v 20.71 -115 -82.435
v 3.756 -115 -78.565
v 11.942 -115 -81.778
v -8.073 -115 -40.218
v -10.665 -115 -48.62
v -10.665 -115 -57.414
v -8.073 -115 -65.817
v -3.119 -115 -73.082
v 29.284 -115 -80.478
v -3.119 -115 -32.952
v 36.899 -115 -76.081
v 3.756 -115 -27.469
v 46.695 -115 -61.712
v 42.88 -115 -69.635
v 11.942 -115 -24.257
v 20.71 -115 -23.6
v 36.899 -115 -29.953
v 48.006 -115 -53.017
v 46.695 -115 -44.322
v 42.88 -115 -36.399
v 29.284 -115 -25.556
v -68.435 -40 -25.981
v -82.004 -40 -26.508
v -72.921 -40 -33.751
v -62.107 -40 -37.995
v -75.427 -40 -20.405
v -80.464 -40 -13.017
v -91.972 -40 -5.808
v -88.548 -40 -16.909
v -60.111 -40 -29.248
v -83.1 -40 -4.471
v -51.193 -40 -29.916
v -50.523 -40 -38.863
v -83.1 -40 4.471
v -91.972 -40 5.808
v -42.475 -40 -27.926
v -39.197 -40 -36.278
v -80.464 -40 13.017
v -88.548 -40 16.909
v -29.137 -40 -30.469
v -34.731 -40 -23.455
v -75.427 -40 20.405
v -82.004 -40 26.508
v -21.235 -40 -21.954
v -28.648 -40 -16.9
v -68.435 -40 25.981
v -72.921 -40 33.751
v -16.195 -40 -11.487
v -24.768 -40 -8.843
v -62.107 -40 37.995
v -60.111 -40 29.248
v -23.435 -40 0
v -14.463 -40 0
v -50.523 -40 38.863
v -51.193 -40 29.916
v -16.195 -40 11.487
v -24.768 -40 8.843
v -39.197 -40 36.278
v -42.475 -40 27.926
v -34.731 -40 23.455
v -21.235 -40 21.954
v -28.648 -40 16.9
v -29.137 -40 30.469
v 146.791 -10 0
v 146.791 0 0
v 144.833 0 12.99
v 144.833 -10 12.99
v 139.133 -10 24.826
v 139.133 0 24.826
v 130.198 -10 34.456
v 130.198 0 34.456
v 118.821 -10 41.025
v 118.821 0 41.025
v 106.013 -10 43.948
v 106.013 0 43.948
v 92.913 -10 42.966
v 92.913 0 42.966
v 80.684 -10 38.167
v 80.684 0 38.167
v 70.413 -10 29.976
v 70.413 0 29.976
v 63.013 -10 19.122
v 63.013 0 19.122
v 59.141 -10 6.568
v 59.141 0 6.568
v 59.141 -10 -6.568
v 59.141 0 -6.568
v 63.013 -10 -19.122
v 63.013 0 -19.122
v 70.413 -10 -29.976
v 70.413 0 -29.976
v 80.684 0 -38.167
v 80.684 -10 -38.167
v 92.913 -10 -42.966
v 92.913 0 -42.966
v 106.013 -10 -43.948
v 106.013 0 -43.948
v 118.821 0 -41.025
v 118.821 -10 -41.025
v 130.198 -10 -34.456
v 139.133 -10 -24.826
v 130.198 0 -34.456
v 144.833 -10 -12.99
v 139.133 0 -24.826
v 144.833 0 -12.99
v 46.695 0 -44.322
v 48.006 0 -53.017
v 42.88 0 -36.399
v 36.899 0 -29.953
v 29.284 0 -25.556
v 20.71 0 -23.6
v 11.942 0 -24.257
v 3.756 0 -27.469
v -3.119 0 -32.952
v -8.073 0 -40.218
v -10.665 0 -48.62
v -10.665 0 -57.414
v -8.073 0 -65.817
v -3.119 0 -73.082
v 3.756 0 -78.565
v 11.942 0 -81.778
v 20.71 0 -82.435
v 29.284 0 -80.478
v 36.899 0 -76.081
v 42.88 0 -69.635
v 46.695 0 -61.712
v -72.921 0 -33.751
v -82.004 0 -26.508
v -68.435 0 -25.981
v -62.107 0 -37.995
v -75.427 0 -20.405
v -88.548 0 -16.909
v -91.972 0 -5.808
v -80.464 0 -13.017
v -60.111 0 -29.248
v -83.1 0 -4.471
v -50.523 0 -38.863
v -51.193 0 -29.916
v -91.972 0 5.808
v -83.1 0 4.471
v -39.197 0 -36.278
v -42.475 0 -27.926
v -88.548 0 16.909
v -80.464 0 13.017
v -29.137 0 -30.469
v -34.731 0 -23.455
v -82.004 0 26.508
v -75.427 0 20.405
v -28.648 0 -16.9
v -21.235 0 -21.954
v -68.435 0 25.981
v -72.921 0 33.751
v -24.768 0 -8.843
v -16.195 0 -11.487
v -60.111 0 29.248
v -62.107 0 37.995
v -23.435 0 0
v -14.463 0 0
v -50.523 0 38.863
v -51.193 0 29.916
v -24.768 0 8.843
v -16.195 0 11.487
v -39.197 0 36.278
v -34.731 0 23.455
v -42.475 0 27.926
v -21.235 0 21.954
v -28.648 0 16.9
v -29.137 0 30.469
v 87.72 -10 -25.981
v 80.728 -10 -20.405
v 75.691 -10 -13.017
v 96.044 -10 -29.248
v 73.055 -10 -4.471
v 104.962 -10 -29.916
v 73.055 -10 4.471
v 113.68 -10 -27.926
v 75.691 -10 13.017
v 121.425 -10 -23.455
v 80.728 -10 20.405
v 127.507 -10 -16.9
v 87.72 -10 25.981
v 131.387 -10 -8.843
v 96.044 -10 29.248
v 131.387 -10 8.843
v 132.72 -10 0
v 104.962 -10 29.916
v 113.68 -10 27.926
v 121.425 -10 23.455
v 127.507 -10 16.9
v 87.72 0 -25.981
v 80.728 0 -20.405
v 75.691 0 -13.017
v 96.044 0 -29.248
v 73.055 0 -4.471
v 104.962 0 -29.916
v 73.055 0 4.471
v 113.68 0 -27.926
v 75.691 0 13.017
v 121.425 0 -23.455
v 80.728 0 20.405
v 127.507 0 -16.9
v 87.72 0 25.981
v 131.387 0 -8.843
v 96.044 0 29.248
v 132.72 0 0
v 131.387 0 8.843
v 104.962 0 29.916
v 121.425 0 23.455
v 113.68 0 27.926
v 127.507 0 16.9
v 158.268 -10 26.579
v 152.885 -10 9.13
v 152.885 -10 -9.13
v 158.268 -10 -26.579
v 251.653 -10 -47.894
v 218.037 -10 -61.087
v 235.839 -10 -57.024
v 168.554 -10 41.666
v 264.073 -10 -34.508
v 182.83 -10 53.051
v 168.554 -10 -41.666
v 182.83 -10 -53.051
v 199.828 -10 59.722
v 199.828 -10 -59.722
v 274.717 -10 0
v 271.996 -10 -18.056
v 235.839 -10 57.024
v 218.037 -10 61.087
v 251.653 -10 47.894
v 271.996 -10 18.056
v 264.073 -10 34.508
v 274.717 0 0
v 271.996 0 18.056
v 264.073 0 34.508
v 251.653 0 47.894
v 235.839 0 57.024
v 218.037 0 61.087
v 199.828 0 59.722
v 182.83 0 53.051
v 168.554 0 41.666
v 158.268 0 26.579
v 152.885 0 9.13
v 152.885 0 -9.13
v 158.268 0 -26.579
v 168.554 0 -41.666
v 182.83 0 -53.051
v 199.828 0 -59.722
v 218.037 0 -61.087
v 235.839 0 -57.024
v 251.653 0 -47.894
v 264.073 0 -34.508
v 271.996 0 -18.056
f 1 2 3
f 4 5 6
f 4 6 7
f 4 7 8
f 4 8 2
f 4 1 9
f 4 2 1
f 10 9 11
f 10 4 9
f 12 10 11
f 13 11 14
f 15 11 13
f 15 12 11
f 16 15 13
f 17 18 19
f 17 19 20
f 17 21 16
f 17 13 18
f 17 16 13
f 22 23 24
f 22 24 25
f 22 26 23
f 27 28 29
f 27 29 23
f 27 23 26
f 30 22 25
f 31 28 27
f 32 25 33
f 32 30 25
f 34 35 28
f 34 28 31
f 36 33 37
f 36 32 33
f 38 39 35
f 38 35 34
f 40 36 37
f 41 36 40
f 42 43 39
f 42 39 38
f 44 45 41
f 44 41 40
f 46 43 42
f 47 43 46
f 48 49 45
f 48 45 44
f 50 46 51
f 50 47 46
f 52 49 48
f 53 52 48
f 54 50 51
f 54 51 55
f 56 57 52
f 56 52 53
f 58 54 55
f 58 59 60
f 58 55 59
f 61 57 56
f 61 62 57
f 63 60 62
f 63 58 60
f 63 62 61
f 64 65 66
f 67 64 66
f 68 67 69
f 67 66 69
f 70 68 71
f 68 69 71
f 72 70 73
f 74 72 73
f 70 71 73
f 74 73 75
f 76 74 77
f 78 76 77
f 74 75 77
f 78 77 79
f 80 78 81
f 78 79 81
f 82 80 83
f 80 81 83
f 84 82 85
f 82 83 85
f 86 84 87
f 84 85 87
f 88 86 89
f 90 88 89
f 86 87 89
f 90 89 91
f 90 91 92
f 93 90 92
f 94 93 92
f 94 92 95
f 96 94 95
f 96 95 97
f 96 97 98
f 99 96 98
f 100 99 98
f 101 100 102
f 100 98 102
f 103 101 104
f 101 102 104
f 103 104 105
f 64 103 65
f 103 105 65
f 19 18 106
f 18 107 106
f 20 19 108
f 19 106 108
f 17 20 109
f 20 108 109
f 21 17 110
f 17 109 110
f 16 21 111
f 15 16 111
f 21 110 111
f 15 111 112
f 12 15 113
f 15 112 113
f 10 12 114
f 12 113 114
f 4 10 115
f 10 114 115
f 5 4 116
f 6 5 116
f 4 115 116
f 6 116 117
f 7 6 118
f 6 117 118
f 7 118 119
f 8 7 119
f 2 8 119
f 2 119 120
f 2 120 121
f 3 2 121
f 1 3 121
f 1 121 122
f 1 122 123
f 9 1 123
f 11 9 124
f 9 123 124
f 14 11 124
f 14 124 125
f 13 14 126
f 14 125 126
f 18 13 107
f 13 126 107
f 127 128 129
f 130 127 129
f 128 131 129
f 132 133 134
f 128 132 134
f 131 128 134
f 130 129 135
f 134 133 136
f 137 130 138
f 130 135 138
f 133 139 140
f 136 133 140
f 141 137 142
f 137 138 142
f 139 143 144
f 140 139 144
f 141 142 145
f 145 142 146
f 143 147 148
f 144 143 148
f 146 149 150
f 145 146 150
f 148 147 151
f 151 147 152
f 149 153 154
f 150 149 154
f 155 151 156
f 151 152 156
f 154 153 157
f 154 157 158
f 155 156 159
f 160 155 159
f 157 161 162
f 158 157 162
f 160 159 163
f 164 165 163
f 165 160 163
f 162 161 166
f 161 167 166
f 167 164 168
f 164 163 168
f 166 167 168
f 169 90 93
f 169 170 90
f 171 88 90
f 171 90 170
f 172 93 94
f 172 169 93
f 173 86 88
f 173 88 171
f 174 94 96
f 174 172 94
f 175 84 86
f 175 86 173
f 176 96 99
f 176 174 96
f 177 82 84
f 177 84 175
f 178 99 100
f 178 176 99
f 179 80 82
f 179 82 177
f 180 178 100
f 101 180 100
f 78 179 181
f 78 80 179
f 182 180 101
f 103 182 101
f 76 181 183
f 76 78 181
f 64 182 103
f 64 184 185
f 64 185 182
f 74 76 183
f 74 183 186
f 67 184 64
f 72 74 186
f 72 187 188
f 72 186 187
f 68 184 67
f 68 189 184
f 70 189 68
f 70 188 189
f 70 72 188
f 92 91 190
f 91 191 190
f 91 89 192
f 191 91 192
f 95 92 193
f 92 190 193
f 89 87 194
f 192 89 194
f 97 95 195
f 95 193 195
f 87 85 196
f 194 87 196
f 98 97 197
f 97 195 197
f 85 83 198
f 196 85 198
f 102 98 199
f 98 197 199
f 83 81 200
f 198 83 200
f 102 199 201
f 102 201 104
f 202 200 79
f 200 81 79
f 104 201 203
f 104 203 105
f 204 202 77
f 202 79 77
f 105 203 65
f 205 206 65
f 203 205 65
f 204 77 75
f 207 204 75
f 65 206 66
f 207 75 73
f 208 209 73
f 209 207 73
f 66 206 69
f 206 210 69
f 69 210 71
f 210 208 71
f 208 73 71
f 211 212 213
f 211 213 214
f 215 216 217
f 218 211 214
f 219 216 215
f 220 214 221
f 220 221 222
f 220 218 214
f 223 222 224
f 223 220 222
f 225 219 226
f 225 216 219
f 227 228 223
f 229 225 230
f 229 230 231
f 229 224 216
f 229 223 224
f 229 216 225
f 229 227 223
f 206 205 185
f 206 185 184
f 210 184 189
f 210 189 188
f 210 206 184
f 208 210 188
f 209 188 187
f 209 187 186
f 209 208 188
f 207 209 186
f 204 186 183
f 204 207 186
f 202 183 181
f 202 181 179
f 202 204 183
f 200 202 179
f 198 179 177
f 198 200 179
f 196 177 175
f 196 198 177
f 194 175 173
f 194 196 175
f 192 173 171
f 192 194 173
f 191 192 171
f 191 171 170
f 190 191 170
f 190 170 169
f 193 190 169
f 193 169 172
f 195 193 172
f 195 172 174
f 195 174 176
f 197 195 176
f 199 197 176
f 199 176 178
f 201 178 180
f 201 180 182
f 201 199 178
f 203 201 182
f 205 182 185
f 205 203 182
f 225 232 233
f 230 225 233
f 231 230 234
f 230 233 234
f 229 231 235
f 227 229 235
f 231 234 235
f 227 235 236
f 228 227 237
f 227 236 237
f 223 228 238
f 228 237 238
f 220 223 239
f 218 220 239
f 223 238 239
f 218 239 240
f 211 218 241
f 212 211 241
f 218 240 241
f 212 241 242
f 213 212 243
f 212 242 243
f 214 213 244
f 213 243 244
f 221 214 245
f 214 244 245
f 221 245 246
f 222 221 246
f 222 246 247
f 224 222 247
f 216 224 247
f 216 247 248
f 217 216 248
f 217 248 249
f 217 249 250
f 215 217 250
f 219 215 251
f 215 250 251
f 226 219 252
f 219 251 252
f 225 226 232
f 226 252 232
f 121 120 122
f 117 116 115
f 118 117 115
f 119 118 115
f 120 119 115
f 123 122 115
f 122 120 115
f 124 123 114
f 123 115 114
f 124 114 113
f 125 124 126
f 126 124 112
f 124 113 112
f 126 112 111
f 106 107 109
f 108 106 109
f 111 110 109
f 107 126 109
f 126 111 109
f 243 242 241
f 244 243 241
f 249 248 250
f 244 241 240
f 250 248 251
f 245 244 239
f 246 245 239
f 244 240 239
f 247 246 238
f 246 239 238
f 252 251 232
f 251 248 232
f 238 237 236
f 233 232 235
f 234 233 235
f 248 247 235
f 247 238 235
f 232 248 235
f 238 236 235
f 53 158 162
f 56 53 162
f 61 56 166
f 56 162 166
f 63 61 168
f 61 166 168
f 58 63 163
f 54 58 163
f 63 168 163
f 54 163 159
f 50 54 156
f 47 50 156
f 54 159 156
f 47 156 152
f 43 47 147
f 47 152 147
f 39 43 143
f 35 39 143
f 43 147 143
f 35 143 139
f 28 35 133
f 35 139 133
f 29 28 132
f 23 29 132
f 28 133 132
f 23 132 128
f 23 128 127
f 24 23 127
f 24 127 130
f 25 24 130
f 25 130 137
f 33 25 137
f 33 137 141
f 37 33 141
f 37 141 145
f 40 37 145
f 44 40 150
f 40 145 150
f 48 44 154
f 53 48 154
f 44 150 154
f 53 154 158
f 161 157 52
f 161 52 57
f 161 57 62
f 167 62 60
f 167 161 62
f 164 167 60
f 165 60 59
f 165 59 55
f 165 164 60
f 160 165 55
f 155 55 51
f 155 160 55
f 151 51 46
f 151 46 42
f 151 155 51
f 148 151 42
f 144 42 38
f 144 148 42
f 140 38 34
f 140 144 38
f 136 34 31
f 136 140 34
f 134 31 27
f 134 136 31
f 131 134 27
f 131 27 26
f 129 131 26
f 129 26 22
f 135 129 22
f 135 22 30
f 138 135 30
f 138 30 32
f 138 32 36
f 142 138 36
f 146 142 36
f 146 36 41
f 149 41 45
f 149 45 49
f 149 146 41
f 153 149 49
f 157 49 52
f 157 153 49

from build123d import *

# Parameters (mm, degrees)
F1_W      = 24.137928909
F1_H      = 30
F0_R      = 38.9718812083
F0_R_2    = 30
F3_DEPTH  = 40
F4_R      = 44.0713811991
F4_R_2    = 30
F5_DEPTH  = 10
F6_R      = 61.2580869617
F7_DEPTH  = 10
F9_R      = 29.5
F10_DEPTH = 50
F11_DEPTH = 25
F12_R     = 29.5
F13_DEPTH = 40


with BuildPart() as f2:
    # F1 (on Front) → F2 (revolve)
    with BuildSketch(Plane.XZ):
        with Locations((22.931023988, 15)):
            Rectangle(F1_W, F1_H)
    revolve(axis=Axis((22.931023988, 0, 0), (-1, 0, 0)))


with BuildPart() as f3:
    # F0 (on Front) → F3 (new body)
    with BuildSketch(Plane.XZ):
        with Locations((-53.4353193952, 0)):
            Circle(F0_R)
        with Locations((-53.4353193952, 0)):
            Circle(F0_R_2, mode=Mode.SUBTRACT)
    extrude(amount=F3_DEPTH)


with BuildPart() as f5:
    # F4 (on Front) → F5 (new body)
    with BuildSketch(Plane.XZ):
        with Locations((102.7198269619, 0)):
            Circle(F4_R)
        with Locations((102.7198269619, 0)):
            Circle(F4_R_2, mode=Mode.SUBTRACT)
    extrude(amount=F5_DEPTH)


with BuildPart() as f7:
    # F6 (on Front) → F7 (new body)
    with BuildSketch(Plane.XZ):
        with Locations((213.4593129158, 0)):
            Circle(F6_R)
    extrude(amount=F7_DEPTH)


with BuildPart() as f10:
    # F9 (on Front) → F10 (new body)
    with BuildSketch(Plane.XZ):
        with Locations((18.5059607029, -53.0171394348)):
            Circle(F9_R)
    extrude(amount=F10_DEPTH)

    # F11 (add): a face of the model
    f11_faces = [f10.faces().sort_by_distance(p)[0] for p in [
        (18.5059607029, -50, -53.0171394348),
    ]]
    extrude(f11_faces, amount=F11_DEPTH)

    # F12 (on face) → F13 (join)
    with BuildSketch(Plane.XZ.offset(75)):
        with Locations((18.5059607029, -53.0171394348)):
            Circle(F12_R)
    extrude(amount=F13_DEPTH)


solid = Compound([f3.part, f5.part, f7.part, f10.part])
